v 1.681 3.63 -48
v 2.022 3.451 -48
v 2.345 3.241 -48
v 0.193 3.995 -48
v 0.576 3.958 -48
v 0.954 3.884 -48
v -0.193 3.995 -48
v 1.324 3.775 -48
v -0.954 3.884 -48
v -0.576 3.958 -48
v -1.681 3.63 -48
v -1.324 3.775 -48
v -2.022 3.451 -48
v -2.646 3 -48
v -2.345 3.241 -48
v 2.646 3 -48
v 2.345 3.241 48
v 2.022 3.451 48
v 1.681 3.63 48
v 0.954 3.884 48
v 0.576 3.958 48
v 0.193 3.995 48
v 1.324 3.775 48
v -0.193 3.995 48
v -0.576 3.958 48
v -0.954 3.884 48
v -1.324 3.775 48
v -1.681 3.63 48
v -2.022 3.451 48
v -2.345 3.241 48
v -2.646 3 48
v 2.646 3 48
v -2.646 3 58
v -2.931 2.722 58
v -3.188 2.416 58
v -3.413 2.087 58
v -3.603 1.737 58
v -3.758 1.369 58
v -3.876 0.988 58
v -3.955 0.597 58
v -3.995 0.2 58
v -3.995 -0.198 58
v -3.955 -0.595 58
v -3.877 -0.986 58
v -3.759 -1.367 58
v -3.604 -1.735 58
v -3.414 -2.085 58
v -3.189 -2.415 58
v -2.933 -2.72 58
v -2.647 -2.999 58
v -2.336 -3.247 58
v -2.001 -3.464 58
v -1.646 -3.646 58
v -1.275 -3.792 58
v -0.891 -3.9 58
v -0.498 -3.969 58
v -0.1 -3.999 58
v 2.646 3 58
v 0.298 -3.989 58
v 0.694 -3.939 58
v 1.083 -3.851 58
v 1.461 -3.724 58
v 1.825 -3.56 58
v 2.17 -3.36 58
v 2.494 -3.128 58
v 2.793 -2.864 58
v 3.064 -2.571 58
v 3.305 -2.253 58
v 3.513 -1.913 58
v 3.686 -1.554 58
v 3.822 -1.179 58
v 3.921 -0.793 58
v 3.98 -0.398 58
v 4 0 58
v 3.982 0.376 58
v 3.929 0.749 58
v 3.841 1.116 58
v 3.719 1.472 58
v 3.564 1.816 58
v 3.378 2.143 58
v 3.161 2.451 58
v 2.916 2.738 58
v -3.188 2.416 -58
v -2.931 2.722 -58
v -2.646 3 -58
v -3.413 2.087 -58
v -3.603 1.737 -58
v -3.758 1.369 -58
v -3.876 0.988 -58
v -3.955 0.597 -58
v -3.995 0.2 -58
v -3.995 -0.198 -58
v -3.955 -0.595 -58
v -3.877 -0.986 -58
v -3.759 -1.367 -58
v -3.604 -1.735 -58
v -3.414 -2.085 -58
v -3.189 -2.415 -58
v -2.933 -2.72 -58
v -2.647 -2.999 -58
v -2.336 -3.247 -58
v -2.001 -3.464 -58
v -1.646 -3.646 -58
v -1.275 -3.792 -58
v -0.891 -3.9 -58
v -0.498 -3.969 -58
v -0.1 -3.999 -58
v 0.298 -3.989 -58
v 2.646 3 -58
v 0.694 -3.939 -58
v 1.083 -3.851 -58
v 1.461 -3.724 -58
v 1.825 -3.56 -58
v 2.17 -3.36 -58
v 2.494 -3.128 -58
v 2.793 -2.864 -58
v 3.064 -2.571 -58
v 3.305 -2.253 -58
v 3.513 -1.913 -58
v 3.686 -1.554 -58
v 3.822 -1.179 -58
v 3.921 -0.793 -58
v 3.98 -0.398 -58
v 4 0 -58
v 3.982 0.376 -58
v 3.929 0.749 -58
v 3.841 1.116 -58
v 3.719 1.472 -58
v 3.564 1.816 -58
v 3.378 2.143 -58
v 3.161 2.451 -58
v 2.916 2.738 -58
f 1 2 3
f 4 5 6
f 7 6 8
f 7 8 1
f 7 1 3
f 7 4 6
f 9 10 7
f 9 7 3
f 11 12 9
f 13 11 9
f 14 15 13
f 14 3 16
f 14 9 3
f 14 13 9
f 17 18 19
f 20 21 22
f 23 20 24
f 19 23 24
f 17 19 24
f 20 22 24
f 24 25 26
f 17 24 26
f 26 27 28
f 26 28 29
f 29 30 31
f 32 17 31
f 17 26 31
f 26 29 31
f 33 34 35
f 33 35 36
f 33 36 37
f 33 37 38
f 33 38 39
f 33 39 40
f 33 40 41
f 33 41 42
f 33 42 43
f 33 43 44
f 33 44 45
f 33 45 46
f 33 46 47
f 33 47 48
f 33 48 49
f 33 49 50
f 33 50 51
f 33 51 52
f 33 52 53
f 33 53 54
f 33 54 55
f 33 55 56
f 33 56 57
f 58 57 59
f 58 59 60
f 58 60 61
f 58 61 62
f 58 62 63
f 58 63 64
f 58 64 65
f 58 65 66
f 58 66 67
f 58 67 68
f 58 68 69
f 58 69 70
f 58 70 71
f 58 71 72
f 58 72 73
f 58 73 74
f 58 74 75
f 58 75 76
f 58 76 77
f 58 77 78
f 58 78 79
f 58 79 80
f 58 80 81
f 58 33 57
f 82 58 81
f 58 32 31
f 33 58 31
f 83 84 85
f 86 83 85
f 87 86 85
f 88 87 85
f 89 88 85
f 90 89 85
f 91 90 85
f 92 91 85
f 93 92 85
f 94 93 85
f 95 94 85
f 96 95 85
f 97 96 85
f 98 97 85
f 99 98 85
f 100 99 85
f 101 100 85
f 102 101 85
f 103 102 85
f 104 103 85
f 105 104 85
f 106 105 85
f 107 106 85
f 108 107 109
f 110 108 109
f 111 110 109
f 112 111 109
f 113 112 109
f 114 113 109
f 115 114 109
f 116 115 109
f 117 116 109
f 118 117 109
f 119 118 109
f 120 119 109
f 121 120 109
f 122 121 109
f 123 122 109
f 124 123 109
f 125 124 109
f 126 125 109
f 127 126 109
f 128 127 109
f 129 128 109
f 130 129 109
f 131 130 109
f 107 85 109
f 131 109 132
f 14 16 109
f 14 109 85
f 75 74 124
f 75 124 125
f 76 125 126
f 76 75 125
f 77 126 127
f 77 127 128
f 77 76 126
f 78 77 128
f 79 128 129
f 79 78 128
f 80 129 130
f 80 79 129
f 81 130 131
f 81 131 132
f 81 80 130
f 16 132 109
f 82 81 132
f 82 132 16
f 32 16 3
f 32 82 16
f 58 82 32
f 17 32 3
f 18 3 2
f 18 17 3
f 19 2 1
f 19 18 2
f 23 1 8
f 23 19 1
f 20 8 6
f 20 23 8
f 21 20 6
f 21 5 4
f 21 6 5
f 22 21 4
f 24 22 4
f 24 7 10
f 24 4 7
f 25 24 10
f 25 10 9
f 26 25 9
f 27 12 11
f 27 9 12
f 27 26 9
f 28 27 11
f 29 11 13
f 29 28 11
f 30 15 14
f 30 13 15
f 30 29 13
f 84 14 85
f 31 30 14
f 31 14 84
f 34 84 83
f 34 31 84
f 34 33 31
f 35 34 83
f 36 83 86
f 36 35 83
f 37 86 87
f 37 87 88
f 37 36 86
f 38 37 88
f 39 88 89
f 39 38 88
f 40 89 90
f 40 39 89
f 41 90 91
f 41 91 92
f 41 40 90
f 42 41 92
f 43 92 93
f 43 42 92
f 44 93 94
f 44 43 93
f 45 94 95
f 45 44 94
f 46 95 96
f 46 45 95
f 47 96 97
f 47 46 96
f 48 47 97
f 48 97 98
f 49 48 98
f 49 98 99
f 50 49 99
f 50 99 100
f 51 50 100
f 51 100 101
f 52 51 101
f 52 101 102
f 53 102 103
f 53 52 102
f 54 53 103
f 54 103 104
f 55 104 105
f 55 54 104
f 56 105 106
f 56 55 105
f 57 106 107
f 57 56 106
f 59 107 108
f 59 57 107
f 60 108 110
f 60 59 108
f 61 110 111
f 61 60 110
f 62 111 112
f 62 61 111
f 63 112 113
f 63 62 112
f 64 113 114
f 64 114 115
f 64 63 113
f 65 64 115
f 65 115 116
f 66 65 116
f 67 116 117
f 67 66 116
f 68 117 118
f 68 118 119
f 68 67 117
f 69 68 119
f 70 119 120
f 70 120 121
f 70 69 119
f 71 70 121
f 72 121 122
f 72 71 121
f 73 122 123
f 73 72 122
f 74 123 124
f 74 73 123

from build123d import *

# Parameters (mm, degrees)
RESSALTO_EXTRUS_O1_DEPTH      = 58
RESSALTO_EXTRUS_O1_DEPTH_BACK = 58
ESBO_O1_R                     = 4
CORTE_EXTRUS_O1_DEPTH         = 10


with BuildPart() as part:
    # Esboço1 → Ressalto-extrusão1 (new, two sides: drawn at the far end of the back side and taken through both)
    with BuildSketch(Plane.XY.offset(-RESSALTO_EXTRUS_O1_DEPTH_BACK)):
        Circle(ESBO_O1_R)
    extrude(amount=RESSALTO_EXTRUS_O1_DEPTH + RESSALTO_EXTRUS_O1_DEPTH_BACK)

    # Esboço2 → Corte-extrusão1 (cut)
    with BuildSketch(Plane.XY.offset(58)):
        with BuildLine():
            Line((2.645751311, 3), (-2.645751311, 3))
            ThreePointArc((-2.645751311, 3), (0, 4), (2.645751311, 3))
        make_face()
    corte_extrus_o1 = extrude(amount=-CORTE_EXTRUS_O1_DEPTH, mode=Mode.SUBTRACT)

    # Espelhar2: Corte-extrusão1 across plane
    add(corte_extrus_o1.mirror(Plane.XY), mode=Mode.SUBTRACT)


solid = part.part
